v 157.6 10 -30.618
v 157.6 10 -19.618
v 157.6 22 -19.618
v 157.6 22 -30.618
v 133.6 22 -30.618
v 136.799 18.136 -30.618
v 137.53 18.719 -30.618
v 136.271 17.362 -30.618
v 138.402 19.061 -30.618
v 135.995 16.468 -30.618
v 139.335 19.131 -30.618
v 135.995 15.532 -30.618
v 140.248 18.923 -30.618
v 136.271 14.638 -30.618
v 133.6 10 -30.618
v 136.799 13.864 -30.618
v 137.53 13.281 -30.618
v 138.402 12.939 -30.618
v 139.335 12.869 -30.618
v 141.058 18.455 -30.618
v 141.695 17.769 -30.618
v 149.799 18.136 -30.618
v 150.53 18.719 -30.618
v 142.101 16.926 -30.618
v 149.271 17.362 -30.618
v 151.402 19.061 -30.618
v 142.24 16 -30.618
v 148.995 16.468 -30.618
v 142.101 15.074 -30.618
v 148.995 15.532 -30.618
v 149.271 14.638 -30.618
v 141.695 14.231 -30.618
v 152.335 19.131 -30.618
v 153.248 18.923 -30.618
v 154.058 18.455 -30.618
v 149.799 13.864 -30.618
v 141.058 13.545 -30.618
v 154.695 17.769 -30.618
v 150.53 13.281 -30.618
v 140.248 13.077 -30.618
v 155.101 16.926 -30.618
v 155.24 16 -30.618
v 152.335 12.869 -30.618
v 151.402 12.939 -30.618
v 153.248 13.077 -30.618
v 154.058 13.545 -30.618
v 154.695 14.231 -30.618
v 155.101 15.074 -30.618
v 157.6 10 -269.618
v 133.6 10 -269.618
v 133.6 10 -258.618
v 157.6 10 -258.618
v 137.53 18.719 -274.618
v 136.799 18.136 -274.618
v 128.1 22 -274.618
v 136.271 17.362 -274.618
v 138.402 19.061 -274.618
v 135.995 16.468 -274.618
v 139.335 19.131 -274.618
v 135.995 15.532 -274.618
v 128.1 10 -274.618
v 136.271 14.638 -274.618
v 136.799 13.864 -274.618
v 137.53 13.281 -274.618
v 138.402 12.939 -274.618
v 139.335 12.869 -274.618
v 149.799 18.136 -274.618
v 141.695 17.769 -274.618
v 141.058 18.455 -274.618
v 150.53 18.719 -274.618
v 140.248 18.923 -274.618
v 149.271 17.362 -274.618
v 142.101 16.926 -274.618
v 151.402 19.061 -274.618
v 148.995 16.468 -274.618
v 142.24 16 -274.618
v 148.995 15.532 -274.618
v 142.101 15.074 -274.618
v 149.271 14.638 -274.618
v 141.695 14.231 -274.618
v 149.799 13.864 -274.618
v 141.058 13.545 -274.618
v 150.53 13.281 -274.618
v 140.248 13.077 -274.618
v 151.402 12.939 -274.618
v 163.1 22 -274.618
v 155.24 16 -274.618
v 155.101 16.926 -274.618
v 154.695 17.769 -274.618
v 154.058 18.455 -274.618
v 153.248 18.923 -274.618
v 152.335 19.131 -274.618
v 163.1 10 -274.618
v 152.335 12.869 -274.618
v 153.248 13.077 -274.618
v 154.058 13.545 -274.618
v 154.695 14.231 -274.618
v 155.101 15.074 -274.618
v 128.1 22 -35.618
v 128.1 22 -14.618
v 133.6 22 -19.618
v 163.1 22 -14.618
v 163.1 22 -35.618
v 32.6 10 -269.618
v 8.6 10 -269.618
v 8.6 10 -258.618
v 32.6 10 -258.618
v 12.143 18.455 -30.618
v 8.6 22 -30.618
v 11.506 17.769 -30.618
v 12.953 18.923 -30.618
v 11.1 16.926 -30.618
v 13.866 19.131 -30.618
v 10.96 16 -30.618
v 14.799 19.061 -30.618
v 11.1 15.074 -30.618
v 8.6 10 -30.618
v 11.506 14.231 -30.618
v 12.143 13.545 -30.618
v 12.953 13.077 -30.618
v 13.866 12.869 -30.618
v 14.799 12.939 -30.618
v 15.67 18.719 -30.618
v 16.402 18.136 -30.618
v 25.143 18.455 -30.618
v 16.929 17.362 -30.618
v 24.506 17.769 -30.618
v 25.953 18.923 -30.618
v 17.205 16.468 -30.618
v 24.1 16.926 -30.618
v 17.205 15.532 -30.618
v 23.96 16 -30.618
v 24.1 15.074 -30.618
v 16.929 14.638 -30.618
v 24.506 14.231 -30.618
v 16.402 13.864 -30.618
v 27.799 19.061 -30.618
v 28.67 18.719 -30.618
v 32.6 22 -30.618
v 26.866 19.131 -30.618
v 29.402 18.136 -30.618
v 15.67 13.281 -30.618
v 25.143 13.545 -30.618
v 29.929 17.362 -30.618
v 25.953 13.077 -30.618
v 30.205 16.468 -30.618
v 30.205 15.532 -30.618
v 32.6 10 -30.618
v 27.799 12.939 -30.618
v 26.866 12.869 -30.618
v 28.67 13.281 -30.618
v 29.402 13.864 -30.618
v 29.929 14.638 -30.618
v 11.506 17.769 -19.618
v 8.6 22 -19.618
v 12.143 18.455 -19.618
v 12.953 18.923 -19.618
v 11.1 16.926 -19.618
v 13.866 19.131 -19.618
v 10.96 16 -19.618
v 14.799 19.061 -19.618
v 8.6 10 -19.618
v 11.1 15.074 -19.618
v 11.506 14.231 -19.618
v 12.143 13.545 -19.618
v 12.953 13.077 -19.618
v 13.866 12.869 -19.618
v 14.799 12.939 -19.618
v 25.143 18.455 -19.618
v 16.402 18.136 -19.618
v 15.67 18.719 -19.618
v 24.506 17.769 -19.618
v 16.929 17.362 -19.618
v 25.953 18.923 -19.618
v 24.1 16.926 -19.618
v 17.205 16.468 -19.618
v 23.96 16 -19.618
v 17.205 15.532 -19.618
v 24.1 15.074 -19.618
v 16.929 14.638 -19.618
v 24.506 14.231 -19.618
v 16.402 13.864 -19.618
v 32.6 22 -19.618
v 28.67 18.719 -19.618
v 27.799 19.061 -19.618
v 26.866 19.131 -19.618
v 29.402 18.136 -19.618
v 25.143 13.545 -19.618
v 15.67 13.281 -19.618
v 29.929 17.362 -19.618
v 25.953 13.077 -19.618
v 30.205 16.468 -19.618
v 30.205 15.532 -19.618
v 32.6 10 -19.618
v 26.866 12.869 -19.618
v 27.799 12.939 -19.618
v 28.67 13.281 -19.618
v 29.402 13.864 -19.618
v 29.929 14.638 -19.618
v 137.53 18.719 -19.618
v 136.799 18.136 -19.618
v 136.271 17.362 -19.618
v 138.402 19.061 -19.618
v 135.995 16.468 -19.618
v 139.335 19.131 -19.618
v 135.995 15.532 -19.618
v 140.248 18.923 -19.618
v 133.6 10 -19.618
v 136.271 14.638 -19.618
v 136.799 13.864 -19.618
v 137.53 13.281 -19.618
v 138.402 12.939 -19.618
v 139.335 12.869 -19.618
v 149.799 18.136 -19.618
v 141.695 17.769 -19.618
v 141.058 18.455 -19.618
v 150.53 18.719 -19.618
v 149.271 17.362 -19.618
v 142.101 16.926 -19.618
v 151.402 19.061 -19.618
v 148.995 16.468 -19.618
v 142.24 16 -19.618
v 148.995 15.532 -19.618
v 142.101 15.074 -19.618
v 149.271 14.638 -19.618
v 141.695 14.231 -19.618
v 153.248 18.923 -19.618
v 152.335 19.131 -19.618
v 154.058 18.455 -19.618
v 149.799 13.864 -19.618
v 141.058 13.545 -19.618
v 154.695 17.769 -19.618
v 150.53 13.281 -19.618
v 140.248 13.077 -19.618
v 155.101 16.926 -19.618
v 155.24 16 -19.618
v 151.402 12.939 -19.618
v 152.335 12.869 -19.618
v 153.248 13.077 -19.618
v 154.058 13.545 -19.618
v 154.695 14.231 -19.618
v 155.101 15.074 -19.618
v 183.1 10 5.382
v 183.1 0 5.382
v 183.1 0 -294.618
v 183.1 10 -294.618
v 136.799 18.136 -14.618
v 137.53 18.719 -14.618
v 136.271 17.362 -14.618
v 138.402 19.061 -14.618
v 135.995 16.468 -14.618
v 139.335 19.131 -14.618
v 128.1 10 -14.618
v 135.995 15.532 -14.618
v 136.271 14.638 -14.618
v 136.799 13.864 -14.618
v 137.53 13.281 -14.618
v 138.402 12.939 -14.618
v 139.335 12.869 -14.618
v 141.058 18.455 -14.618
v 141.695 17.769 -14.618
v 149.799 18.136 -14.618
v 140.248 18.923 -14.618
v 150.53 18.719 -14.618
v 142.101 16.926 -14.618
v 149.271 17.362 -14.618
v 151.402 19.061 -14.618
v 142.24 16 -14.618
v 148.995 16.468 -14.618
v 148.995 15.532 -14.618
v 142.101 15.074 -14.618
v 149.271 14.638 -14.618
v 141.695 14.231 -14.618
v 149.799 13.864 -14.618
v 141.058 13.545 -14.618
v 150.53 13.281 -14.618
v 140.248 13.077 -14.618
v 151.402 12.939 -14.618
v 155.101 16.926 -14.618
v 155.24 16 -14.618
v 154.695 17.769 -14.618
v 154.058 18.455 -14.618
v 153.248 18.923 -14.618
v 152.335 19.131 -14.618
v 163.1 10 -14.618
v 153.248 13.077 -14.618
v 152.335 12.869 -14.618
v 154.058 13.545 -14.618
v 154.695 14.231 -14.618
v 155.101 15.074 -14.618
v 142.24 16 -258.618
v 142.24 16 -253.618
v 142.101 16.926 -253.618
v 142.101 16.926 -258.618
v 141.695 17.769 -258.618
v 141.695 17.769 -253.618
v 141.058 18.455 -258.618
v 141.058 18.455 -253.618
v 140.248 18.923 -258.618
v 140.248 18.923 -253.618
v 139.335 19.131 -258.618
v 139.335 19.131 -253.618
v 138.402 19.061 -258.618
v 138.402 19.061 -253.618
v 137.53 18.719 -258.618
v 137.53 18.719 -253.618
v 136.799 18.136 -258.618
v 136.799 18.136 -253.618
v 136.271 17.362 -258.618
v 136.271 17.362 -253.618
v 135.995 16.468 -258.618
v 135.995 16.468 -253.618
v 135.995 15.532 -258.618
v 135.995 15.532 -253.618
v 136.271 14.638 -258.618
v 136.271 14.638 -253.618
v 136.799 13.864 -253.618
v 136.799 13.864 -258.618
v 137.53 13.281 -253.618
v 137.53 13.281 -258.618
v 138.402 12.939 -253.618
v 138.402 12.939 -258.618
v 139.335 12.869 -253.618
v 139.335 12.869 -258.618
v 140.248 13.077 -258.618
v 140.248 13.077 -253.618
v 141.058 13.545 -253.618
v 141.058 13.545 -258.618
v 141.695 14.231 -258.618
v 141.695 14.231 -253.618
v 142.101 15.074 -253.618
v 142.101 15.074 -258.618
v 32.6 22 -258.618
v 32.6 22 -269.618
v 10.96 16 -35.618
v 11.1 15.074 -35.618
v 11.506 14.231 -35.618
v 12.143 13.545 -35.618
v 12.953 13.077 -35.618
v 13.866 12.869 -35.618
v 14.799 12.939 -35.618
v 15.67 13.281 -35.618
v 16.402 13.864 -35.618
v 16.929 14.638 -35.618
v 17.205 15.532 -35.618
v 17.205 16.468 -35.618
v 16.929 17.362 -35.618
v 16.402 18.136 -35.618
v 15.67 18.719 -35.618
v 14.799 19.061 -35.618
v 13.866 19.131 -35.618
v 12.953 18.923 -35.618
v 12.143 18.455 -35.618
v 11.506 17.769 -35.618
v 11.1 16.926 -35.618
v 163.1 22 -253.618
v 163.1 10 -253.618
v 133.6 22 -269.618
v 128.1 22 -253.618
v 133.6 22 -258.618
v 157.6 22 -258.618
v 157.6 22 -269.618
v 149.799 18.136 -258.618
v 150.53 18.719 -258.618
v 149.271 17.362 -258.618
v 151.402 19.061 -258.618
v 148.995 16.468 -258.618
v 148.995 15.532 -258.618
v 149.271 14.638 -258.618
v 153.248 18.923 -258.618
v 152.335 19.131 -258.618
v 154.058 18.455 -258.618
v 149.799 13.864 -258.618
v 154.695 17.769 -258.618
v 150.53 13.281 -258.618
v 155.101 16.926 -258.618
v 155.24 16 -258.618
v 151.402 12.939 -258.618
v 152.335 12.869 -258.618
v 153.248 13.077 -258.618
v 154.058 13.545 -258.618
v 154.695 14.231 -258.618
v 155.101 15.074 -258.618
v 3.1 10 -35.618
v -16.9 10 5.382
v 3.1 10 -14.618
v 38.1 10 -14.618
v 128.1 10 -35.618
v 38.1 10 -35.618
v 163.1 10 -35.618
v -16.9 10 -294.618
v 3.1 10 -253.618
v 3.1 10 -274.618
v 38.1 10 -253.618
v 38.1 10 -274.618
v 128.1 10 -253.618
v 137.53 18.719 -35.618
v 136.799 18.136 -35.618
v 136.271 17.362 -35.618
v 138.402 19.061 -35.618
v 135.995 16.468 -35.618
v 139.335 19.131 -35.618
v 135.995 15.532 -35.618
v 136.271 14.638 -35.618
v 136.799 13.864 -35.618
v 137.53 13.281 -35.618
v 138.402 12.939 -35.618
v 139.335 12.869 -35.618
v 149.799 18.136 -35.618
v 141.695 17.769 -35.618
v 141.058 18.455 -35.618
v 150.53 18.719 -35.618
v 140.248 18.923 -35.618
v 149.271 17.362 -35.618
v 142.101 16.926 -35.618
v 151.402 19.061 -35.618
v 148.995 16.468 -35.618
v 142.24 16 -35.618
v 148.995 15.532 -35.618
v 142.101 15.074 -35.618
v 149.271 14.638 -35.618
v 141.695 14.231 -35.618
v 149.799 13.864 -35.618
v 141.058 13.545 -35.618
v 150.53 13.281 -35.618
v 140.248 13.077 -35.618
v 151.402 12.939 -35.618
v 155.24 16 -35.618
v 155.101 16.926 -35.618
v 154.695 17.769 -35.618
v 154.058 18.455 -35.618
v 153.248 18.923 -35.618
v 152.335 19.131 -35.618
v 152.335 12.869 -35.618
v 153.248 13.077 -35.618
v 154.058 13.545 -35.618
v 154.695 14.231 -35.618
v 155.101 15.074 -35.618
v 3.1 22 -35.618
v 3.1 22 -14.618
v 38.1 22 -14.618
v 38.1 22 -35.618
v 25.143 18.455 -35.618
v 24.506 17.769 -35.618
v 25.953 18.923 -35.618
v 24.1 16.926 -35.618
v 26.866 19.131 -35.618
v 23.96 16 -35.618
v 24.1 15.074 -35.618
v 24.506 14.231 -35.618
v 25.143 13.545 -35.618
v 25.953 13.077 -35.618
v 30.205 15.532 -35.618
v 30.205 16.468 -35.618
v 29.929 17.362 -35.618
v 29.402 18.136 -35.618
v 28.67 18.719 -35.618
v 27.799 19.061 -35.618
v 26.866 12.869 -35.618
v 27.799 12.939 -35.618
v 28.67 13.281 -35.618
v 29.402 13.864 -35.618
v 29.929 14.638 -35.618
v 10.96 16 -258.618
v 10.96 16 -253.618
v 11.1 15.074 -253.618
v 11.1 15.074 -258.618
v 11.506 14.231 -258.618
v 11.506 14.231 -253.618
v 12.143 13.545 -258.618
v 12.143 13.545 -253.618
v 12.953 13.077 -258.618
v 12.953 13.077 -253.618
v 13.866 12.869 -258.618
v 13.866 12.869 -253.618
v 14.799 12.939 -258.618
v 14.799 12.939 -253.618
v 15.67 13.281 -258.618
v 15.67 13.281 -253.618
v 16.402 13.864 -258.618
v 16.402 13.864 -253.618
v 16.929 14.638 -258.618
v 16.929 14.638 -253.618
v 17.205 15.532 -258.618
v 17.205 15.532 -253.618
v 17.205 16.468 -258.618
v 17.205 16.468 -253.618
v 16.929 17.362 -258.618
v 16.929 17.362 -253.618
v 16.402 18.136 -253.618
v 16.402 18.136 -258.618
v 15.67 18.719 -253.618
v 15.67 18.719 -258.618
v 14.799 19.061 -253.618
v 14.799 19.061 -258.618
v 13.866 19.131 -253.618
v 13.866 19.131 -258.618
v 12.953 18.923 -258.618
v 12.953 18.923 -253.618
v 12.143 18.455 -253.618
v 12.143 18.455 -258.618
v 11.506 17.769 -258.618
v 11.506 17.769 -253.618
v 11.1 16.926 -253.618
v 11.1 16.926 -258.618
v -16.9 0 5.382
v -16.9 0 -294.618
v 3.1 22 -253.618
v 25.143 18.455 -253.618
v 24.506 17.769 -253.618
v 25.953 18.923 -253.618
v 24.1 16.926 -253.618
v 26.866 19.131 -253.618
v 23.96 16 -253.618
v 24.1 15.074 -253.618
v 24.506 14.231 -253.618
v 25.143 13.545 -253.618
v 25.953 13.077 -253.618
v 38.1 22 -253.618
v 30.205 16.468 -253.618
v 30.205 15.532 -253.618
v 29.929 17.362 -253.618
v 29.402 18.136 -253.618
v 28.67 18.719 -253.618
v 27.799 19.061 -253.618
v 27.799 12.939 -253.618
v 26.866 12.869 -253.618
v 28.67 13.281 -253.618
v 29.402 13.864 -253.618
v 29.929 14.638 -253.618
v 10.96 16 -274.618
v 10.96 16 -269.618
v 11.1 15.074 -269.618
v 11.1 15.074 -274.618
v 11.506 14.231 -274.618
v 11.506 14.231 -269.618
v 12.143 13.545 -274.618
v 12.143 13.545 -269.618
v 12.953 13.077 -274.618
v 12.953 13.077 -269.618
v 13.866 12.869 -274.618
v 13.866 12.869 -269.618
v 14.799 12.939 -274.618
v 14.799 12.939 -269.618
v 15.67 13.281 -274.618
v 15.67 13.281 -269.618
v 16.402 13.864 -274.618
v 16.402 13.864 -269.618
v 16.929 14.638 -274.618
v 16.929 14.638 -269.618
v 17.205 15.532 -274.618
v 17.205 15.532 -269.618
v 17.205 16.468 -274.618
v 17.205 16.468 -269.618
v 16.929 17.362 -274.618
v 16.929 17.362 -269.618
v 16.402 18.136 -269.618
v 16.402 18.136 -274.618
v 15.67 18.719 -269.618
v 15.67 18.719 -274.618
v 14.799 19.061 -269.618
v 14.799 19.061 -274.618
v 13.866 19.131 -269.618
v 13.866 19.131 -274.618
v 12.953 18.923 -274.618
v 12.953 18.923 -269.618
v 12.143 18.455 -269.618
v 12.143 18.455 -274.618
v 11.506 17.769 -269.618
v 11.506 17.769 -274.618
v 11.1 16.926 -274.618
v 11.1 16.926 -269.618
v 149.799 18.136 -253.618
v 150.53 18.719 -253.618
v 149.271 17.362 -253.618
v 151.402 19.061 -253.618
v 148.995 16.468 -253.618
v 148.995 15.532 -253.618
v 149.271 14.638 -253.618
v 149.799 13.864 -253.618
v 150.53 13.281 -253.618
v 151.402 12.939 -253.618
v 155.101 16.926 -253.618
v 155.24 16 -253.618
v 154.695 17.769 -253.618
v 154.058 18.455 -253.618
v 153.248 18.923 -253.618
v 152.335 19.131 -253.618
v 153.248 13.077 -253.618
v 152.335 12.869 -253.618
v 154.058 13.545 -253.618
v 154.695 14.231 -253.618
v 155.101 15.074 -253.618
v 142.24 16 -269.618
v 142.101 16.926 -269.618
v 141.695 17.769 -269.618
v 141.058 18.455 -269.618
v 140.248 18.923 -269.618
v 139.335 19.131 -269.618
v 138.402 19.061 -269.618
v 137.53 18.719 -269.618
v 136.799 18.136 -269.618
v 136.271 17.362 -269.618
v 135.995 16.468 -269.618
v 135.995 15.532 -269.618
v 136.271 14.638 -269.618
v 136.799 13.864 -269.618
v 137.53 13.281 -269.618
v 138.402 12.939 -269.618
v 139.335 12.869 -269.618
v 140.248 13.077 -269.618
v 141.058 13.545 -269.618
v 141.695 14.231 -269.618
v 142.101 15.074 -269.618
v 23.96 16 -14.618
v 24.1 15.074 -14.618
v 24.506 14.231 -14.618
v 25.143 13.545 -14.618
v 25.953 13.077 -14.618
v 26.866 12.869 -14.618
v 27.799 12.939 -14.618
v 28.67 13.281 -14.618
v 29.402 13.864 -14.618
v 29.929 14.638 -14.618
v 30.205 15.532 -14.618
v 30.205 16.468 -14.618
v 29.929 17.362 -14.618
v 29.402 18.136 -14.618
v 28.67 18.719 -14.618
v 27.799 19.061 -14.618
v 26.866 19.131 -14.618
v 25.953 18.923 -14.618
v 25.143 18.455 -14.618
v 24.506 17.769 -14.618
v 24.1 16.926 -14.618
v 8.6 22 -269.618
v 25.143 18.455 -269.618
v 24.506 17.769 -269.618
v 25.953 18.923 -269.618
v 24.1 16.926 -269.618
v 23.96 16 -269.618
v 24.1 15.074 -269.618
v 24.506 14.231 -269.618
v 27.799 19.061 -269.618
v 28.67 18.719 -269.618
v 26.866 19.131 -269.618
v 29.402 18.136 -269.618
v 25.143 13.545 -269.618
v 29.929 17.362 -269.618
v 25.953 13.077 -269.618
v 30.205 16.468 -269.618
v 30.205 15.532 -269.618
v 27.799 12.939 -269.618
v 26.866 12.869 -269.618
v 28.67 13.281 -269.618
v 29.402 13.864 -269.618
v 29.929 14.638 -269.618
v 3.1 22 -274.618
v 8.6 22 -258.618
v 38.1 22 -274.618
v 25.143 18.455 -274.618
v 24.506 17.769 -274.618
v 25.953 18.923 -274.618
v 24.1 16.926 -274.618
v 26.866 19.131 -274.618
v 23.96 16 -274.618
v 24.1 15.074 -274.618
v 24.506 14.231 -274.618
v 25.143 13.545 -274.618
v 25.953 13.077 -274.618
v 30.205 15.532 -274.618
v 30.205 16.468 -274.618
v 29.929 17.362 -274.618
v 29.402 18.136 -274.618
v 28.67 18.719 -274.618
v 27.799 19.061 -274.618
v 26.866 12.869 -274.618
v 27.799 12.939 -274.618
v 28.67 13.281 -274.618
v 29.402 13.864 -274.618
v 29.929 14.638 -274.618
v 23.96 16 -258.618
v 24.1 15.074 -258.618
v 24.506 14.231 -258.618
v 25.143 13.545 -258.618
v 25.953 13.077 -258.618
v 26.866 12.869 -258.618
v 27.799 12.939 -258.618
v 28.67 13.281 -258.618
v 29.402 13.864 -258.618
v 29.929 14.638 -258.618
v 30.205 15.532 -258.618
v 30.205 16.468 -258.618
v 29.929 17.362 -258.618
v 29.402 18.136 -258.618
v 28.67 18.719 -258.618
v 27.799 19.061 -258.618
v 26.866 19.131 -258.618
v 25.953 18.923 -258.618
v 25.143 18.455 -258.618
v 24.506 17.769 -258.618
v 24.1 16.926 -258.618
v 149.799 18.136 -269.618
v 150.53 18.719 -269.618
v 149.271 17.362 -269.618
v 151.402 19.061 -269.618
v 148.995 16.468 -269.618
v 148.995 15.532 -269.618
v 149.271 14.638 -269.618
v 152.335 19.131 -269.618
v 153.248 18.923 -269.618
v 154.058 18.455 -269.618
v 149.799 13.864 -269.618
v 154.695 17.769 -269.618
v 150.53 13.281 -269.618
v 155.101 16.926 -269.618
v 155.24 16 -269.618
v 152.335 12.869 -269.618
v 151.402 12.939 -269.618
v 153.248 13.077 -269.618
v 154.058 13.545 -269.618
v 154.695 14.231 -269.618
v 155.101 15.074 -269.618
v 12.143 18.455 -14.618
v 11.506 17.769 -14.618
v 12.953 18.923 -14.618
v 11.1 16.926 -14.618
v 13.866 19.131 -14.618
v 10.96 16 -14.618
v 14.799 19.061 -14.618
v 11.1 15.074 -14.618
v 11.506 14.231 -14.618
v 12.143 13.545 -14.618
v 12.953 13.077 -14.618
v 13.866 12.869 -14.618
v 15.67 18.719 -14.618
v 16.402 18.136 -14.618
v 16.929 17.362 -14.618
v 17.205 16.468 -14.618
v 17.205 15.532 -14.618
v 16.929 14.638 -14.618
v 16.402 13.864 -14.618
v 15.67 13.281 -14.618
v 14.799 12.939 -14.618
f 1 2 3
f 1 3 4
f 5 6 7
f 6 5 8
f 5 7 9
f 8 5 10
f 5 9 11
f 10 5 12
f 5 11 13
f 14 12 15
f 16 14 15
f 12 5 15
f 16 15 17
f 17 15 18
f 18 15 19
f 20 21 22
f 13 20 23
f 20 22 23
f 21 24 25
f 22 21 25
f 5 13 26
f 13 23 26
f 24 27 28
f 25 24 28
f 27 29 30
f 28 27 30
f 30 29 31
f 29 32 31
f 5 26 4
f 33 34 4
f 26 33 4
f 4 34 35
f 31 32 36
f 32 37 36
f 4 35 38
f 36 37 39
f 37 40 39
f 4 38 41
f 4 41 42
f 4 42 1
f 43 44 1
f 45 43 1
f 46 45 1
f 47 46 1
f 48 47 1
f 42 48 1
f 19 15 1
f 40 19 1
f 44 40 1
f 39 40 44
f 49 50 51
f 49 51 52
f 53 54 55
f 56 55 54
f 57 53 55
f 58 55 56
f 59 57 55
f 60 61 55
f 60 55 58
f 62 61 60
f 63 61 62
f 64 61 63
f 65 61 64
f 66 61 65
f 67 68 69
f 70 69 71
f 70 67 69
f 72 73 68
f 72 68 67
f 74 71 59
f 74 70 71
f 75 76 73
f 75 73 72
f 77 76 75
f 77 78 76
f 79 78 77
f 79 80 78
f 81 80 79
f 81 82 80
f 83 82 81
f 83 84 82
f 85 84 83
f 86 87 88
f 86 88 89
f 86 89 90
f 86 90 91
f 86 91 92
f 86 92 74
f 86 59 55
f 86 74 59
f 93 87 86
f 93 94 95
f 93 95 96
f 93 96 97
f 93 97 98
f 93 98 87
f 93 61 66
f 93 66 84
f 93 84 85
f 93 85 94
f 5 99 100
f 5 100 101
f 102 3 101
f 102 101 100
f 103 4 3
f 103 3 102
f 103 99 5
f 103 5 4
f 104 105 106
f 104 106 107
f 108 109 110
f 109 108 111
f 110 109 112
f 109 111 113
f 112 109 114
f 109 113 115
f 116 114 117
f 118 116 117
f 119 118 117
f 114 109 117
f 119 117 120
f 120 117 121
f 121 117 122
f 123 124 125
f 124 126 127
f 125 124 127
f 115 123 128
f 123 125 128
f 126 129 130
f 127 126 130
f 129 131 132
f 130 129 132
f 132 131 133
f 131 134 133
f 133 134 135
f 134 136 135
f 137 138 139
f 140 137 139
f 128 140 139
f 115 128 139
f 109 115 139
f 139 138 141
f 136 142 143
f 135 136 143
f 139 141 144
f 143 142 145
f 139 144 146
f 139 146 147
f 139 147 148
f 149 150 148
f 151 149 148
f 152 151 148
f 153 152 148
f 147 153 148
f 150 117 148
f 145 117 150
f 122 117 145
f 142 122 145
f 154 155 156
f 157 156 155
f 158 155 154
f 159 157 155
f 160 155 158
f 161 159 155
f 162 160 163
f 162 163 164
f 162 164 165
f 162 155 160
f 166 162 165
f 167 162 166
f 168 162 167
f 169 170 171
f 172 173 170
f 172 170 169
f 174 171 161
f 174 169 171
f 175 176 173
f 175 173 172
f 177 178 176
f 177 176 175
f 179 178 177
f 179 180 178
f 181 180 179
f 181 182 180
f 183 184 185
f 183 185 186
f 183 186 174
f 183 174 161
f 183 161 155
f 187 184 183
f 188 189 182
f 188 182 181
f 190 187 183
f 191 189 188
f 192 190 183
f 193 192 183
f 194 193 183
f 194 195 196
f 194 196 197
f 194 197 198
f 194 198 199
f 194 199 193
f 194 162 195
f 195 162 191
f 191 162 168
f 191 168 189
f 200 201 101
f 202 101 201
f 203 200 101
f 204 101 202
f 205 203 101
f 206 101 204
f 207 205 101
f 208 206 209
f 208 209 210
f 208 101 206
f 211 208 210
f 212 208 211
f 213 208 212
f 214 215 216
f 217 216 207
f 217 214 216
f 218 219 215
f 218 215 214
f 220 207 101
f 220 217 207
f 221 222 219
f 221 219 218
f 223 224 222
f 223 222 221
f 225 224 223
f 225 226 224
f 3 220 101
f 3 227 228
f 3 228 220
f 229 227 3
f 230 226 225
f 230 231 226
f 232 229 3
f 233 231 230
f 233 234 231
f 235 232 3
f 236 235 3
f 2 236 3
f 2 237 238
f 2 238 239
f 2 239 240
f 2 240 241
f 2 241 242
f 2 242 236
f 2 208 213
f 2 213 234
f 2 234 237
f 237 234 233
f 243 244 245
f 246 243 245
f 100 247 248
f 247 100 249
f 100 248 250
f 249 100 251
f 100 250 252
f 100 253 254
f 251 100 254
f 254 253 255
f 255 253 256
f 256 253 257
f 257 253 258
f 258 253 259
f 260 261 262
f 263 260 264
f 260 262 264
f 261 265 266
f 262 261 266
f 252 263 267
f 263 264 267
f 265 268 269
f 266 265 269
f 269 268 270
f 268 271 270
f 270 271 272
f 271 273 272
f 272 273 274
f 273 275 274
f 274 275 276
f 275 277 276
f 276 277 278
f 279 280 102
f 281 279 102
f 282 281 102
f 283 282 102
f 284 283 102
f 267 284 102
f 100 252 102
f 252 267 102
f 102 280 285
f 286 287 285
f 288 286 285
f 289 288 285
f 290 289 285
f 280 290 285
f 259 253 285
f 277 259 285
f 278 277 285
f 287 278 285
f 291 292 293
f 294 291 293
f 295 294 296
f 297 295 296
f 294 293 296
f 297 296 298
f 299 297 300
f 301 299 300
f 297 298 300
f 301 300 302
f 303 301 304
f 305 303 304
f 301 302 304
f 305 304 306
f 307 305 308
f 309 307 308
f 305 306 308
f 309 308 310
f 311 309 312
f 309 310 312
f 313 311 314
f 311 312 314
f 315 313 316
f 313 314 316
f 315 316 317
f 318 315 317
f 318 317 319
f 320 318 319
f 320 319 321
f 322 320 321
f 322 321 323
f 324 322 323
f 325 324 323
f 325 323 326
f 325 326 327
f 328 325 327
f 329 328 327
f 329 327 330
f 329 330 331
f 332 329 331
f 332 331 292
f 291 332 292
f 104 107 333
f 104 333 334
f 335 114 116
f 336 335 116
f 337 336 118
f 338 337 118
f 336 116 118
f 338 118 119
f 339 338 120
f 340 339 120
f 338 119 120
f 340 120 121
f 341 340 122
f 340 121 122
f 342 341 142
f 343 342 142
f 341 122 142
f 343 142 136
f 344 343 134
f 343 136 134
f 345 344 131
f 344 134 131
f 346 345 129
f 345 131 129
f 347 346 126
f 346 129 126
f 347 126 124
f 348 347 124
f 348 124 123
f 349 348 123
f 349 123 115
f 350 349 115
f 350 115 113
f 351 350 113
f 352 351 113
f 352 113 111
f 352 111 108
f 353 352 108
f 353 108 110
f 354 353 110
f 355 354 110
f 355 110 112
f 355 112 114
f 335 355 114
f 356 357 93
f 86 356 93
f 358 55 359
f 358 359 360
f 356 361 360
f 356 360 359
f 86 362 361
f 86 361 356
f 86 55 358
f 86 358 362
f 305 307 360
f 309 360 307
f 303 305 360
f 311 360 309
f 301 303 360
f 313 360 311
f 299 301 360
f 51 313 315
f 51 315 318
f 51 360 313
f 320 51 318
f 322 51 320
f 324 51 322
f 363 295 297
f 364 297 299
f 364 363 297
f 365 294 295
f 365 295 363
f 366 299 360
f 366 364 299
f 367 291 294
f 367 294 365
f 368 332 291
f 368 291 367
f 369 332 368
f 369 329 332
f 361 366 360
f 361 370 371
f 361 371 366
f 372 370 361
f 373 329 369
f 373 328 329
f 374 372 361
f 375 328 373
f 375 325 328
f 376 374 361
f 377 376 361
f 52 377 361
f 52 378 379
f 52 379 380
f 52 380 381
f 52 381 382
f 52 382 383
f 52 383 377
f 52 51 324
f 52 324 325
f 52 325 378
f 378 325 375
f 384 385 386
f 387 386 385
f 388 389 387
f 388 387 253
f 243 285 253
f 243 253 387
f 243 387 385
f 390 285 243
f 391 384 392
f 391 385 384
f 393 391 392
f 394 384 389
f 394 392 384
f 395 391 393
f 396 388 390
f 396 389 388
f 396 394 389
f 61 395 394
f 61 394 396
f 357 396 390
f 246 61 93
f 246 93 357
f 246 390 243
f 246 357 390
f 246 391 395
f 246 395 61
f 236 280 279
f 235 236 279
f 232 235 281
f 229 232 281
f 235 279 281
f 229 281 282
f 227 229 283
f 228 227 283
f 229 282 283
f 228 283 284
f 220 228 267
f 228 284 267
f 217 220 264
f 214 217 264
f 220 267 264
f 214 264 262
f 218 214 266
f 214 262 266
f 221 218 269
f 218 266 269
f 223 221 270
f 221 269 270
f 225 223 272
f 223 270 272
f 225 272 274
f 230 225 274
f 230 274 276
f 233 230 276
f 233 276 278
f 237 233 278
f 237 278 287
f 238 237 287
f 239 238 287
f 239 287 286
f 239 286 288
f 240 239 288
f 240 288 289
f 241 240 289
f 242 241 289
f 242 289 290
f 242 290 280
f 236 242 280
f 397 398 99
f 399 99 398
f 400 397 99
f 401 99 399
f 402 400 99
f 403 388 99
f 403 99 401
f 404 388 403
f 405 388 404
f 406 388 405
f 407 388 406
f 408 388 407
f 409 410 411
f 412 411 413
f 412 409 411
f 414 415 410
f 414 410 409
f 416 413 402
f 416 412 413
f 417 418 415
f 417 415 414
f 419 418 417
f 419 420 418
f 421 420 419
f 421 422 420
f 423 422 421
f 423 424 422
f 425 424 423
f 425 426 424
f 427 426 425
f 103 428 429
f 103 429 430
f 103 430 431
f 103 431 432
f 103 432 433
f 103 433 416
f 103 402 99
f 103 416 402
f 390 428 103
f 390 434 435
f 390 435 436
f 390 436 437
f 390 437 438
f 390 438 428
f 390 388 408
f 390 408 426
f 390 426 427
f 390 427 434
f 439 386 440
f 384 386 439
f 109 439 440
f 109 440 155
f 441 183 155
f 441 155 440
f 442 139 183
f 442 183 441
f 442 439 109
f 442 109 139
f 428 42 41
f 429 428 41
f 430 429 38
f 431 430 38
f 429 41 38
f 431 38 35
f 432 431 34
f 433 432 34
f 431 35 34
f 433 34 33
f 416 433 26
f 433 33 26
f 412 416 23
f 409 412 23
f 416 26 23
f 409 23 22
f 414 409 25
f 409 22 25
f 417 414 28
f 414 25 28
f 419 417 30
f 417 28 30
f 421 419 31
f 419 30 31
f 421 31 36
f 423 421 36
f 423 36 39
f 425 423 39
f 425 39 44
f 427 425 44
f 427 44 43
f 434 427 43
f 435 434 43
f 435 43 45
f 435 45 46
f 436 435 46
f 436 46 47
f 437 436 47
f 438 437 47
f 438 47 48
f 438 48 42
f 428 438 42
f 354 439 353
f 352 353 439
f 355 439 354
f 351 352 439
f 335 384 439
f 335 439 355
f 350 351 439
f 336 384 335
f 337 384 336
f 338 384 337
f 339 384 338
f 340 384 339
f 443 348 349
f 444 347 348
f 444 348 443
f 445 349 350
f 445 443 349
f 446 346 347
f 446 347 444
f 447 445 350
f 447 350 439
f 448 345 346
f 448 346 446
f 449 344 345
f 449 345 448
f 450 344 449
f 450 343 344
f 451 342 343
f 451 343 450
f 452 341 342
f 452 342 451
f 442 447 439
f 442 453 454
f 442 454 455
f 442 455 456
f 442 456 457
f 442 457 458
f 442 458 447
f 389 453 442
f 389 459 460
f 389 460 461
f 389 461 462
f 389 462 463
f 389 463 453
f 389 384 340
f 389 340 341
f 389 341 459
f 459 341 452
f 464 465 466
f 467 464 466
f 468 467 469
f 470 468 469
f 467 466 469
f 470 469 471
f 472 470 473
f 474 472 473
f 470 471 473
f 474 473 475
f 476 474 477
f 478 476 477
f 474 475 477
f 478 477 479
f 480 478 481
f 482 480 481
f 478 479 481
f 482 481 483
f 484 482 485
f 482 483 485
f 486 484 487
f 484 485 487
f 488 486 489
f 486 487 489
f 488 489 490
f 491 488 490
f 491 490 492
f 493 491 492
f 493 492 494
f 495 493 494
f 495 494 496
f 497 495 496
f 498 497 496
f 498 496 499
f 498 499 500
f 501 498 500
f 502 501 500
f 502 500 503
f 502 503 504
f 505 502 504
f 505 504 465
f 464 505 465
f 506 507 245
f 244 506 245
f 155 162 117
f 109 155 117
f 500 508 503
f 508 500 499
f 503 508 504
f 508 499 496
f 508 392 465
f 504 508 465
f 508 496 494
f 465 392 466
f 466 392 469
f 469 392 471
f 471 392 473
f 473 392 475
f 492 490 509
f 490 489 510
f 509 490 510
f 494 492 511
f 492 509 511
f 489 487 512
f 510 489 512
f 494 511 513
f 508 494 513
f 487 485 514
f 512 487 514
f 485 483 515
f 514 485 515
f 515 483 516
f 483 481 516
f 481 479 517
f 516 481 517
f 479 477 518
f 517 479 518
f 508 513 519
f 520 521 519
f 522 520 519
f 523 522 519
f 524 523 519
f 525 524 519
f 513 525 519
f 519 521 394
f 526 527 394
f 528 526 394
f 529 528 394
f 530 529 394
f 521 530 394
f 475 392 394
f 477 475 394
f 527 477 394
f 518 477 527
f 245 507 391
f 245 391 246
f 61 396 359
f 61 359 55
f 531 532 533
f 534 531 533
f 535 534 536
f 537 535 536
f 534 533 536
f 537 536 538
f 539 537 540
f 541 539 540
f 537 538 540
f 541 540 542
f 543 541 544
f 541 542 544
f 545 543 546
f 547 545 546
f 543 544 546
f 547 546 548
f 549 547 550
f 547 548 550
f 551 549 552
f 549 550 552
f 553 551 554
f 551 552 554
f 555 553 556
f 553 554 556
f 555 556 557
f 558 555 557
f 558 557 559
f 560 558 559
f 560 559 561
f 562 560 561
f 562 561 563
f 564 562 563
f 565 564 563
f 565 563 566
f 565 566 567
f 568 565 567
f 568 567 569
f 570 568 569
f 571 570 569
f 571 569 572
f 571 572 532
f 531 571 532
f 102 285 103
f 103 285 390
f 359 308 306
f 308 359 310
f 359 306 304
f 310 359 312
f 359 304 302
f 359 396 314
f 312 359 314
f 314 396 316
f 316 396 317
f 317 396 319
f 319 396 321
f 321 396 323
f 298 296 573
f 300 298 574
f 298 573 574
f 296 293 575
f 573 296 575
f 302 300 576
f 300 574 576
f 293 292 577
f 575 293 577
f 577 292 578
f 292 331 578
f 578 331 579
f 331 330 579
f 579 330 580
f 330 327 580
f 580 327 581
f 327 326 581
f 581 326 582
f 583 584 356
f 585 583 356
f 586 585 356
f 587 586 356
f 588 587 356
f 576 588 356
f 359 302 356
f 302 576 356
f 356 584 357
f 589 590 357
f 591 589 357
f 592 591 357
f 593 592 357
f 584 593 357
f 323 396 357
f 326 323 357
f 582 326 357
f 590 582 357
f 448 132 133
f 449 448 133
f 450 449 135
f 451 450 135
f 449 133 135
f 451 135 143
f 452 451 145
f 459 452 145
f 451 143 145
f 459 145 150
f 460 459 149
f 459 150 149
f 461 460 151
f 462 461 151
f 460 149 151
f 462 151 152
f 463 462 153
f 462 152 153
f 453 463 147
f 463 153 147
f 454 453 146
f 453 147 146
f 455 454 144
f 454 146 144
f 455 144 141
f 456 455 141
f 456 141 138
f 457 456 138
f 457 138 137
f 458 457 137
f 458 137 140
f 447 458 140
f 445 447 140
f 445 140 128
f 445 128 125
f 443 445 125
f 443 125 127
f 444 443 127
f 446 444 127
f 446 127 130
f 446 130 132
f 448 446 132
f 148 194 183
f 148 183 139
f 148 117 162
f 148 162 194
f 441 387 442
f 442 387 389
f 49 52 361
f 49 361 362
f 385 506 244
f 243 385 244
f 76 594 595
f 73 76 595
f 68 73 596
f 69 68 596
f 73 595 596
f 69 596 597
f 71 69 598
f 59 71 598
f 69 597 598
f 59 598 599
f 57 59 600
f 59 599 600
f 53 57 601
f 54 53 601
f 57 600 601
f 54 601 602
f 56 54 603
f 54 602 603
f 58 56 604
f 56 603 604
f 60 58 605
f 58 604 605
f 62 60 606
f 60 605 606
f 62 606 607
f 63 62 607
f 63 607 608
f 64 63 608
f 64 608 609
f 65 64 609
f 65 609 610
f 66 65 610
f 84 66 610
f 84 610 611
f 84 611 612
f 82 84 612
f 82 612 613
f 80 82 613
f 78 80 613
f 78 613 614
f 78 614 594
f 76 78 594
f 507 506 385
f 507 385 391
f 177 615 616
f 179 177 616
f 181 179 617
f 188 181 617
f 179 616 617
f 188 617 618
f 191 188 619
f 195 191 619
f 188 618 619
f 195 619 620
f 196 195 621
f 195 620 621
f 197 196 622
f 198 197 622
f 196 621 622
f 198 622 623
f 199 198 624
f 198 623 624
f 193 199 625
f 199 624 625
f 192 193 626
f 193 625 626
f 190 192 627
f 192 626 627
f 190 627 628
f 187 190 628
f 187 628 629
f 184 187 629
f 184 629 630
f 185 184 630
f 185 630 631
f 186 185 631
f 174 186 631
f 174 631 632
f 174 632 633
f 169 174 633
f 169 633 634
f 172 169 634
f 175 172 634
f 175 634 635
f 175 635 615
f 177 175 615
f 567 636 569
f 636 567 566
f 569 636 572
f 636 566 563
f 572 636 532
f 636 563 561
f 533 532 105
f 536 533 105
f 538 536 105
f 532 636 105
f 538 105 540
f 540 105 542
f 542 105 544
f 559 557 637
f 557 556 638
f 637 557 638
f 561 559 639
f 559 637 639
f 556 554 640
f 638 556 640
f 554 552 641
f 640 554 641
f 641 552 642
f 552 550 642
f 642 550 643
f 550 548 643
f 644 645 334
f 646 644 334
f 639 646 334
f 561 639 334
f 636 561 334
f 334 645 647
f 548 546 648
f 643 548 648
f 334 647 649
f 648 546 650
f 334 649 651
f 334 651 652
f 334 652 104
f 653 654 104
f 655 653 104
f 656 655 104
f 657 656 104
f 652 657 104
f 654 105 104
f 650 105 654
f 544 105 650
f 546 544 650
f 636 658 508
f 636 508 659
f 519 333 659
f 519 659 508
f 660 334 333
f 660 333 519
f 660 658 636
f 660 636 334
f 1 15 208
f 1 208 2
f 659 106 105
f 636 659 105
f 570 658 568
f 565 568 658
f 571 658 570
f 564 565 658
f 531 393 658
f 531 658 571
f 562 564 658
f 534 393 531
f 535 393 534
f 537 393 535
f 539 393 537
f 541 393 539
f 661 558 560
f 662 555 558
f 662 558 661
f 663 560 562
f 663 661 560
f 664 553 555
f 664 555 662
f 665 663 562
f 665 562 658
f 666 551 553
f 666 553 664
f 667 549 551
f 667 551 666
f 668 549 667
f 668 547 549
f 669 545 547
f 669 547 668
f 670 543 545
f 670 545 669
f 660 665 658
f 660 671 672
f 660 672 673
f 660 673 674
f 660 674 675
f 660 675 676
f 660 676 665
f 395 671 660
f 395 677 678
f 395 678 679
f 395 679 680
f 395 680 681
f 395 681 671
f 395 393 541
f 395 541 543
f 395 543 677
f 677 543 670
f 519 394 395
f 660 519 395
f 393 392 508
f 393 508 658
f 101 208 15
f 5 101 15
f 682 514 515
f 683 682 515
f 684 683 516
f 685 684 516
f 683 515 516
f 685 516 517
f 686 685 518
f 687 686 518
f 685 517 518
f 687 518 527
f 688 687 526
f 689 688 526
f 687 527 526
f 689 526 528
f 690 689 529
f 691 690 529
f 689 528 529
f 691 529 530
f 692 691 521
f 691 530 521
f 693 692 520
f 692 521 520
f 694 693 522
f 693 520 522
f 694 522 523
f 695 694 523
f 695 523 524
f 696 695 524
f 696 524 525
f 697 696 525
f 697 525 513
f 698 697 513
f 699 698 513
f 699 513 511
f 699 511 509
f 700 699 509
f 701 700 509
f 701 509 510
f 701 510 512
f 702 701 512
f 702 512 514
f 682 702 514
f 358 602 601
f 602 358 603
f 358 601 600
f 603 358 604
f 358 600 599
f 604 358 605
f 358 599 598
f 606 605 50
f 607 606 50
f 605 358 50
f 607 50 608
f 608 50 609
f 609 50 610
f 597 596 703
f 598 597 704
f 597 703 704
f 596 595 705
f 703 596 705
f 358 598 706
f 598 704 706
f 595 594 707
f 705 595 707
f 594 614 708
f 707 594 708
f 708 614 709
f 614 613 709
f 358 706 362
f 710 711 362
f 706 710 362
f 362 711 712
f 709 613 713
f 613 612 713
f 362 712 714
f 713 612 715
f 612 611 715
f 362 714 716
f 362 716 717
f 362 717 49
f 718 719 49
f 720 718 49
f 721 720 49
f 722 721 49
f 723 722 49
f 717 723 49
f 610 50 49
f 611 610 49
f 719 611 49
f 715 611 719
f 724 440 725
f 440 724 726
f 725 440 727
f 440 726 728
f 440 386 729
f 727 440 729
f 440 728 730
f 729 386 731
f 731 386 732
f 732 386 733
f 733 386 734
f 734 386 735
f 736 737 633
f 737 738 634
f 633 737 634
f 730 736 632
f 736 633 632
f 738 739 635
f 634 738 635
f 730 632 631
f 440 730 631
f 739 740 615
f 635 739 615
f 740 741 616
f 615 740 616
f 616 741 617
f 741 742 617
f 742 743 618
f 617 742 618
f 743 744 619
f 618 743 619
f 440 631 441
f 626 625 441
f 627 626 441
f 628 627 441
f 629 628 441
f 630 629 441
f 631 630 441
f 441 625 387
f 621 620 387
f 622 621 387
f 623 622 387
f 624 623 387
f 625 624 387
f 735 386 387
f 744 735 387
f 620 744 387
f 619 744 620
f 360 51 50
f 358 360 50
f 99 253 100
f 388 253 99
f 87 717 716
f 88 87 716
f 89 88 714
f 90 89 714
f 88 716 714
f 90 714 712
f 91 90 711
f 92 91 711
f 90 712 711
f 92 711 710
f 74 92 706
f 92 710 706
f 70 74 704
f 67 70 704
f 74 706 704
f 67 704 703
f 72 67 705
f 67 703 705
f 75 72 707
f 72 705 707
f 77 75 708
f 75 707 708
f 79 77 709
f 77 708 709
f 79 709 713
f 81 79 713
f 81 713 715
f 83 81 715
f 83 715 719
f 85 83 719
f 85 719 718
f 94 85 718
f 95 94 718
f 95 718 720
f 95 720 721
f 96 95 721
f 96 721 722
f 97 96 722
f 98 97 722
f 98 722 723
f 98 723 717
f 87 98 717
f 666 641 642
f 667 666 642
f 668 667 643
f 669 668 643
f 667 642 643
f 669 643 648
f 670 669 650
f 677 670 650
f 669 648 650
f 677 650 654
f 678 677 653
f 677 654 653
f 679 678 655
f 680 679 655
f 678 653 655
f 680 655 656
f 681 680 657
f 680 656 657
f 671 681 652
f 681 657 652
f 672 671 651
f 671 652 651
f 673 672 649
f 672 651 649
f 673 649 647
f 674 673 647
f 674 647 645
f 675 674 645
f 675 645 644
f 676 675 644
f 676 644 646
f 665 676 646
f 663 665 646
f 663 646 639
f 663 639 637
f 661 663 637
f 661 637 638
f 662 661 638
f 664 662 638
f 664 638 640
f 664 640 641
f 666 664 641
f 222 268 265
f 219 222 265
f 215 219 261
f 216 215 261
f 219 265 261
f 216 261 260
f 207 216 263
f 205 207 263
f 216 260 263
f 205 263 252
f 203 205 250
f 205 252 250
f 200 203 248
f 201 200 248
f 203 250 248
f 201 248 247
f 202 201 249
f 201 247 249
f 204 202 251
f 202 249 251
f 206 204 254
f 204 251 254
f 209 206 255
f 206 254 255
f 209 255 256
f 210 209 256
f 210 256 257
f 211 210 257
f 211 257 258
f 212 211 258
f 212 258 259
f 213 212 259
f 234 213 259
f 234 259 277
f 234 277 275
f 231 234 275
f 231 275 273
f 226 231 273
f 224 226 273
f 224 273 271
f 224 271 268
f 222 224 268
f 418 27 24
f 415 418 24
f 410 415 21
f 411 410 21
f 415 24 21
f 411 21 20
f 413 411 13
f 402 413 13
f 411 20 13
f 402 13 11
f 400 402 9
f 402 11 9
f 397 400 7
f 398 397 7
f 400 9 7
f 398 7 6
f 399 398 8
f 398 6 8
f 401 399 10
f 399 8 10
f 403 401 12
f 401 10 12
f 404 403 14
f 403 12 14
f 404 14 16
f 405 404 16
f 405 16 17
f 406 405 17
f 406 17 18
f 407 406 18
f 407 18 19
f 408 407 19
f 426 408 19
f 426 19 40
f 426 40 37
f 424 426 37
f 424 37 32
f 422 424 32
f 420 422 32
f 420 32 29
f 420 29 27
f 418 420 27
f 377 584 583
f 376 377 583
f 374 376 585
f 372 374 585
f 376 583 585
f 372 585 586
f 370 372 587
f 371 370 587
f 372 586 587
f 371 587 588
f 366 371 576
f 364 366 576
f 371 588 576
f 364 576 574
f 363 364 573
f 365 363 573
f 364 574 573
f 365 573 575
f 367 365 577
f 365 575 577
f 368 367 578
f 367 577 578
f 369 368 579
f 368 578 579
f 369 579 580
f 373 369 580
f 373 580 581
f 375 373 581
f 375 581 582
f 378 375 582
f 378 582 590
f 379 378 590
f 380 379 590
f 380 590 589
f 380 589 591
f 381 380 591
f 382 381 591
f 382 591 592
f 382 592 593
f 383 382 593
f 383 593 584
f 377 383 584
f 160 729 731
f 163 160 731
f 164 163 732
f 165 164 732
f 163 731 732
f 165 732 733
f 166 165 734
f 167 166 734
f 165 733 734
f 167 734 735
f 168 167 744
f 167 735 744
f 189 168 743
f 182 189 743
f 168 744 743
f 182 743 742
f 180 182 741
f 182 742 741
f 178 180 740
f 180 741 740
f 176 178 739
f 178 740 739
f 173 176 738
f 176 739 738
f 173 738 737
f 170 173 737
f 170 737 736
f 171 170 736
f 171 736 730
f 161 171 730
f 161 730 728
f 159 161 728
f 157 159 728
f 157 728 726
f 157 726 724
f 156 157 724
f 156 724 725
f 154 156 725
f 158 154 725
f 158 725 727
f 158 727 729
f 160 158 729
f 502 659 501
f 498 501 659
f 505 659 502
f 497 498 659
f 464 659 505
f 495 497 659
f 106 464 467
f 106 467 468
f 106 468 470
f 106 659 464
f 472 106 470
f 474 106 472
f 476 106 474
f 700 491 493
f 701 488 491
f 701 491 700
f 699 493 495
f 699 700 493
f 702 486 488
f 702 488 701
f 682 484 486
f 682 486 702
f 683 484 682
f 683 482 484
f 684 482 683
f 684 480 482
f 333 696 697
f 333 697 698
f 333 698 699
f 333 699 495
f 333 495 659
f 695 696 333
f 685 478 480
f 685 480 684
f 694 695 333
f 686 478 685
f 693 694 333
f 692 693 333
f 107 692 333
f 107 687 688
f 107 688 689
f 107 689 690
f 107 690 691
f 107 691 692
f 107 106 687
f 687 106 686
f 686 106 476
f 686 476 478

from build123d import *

# Parameters (mm, degrees)
SKETCH1_W           = 200
SKETCH1_H           = 300
BOSS_EXTRUDE1_DEPTH = 10
SKETCH2_W           = 35
SKETCH2_H           = 21
SKETCH2_W_2         = 24
SKETCH2_H_2         = 11
BOSS_EXTRUDE2_DEPTH = 12
SKETCH3_R           = 3.14
CUT_EXTRUDE1_DEPTH  = 1200


with BuildPart() as part:
    # Sketch1 → Boss-Extrude1 (new body)
    with BuildSketch(Plane(origin=(0, 0, 0), x_dir=(1, 0, 0), z_dir=(0, 1, 0))):
        with Locations((83.100354765, 144.618140233)):
            Rectangle(SKETCH1_W, SKETCH1_H)
    extrude(amount=BOSS_EXTRUDE1_DEPTH)

    # Sketch2 → Boss-Extrude2 (add)
    # profile 1 of 4: a face of its own
    with BuildSketch(Plane(origin=(0, 10, 0), x_dir=(1, 0, 0), z_dir=(0, 1, 0))):
        with Locations((20.600354765, 25.118140233)):
            Rectangle(SKETCH2_W, SKETCH2_H)
        with Locations((20.600354765, 25.118140233)):
            Rectangle(SKETCH2_W_2, SKETCH2_H_2, mode=Mode.SUBTRACT)
    # profile 2 of 4: a face of its own
    with BuildSketch(Plane(origin=(0, 10, 0), x_dir=(1, 0, 0), z_dir=(0, 1, 0))):
        with Locations((145.600354765, 25.118140233)):
            Rectangle(SKETCH2_W, SKETCH2_H)
        with Locations((145.600354765, 25.118140233)):
            Rectangle(SKETCH2_W_2, SKETCH2_H_2, mode=Mode.SUBTRACT)
    # profile 3 of 4: a face of its own
    with BuildSketch(Plane(origin=(0, 10, 0), x_dir=(1, 0, 0), z_dir=(0, 1, 0))):
        with Locations((145.600354765, 264.118140233)):
            Rectangle(SKETCH2_W, SKETCH2_H)
        with Locations((145.600354765, 264.118140233)):
            Rectangle(SKETCH2_W_2, SKETCH2_H_2, mode=Mode.SUBTRACT)
    # profile 4 of 4: a face of its own
    with BuildSketch(Plane(origin=(0, 10, 0), x_dir=(1, 0, 0), z_dir=(0, 1, 0))):
        with Locations((20.600354765, 264.118140233)):
            Rectangle(SKETCH2_W, SKETCH2_H)
        with Locations((20.600354765, 264.118140233)):
            Rectangle(SKETCH2_W_2, SKETCH2_H_2, mode=Mode.SUBTRACT)
    extrude(amount=BOSS_EXTRUDE2_DEPTH)

    # Sketch3 → Cut-Extrude1 (cut)
    with BuildSketch(Plane.XY.offset(5.381859767)):
        with Locations(Location((14.100354765, 16, 0), (0, 0, 180))):
            Circle(SKETCH3_R)
        with Locations(Location((27.100354765, 16, 0), (0, 0, 180))):
            Circle(SKETCH3_R)
        with Locations((152.100354765, 16)):
            Circle(SKETCH3_R)
        with Locations((139.100354765, 16)):
            Circle(SKETCH3_R)
    extrude(amount=-CUT_EXTRUDE1_DEPTH, mode=Mode.SUBTRACT)


solid = part.part
